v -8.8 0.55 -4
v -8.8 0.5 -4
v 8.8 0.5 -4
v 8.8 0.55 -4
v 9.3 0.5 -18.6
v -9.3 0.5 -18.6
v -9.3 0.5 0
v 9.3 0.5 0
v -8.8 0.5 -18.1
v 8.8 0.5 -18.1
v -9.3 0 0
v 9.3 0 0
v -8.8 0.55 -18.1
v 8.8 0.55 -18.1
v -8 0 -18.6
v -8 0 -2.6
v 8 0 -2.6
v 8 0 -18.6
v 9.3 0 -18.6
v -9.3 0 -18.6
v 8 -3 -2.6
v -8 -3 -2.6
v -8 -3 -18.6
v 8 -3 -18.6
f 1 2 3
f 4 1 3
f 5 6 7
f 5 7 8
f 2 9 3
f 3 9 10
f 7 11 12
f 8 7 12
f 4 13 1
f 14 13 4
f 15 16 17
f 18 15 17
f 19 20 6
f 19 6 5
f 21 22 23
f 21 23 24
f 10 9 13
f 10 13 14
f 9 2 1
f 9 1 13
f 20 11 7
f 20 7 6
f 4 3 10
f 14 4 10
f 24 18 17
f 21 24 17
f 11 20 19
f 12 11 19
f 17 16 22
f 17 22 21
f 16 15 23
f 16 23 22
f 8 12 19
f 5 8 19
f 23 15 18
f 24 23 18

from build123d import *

# Parameters (mm, degrees)
SKETCH1_W         = 18.6
SKETCH1_H         = 18.6
GLASS_DEPTH       = 0.5
SKETCH2_W         = 17.6
SKETCH2_H         = 14.1
DISPLAY_DEPTH     = 0.05
SKETCH3_W         = 16
SKETCH3_H         = 16
STICKY_FOAM_DEPTH = 3


with BuildPart() as part:
    # Sketch1 → glass (new body)
    with BuildSketch(Plane(origin=(0, 0, 0), x_dir=(1, 0, 0), z_dir=(0, 1, 0))):
        with Locations((0, 9.3)):
            Rectangle(SKETCH1_W, SKETCH1_H)
    extrude(amount=GLASS_DEPTH)


with BuildPart() as body_2:
    # Sketch2 → display (new body)
    with BuildSketch(Plane(origin=(0, 0.5, 0), x_dir=(1, 0, 0), z_dir=(0, 1, 0))):
        with Locations((0, 11.05)):
            Rectangle(SKETCH2_W, SKETCH2_H)
    extrude(amount=DISPLAY_DEPTH)


with BuildPart() as body_3:
    # Sketch3 → sticky_foam (new body)
    with BuildSketch(Plane.XZ):
        with Locations((0, -10.6)):
            Rectangle(SKETCH3_W, SKETCH3_H)
    extrude(amount=STICKY_FOAM_DEPTH)


solid = Compound([part.part, body_2.part, body_3.part])
